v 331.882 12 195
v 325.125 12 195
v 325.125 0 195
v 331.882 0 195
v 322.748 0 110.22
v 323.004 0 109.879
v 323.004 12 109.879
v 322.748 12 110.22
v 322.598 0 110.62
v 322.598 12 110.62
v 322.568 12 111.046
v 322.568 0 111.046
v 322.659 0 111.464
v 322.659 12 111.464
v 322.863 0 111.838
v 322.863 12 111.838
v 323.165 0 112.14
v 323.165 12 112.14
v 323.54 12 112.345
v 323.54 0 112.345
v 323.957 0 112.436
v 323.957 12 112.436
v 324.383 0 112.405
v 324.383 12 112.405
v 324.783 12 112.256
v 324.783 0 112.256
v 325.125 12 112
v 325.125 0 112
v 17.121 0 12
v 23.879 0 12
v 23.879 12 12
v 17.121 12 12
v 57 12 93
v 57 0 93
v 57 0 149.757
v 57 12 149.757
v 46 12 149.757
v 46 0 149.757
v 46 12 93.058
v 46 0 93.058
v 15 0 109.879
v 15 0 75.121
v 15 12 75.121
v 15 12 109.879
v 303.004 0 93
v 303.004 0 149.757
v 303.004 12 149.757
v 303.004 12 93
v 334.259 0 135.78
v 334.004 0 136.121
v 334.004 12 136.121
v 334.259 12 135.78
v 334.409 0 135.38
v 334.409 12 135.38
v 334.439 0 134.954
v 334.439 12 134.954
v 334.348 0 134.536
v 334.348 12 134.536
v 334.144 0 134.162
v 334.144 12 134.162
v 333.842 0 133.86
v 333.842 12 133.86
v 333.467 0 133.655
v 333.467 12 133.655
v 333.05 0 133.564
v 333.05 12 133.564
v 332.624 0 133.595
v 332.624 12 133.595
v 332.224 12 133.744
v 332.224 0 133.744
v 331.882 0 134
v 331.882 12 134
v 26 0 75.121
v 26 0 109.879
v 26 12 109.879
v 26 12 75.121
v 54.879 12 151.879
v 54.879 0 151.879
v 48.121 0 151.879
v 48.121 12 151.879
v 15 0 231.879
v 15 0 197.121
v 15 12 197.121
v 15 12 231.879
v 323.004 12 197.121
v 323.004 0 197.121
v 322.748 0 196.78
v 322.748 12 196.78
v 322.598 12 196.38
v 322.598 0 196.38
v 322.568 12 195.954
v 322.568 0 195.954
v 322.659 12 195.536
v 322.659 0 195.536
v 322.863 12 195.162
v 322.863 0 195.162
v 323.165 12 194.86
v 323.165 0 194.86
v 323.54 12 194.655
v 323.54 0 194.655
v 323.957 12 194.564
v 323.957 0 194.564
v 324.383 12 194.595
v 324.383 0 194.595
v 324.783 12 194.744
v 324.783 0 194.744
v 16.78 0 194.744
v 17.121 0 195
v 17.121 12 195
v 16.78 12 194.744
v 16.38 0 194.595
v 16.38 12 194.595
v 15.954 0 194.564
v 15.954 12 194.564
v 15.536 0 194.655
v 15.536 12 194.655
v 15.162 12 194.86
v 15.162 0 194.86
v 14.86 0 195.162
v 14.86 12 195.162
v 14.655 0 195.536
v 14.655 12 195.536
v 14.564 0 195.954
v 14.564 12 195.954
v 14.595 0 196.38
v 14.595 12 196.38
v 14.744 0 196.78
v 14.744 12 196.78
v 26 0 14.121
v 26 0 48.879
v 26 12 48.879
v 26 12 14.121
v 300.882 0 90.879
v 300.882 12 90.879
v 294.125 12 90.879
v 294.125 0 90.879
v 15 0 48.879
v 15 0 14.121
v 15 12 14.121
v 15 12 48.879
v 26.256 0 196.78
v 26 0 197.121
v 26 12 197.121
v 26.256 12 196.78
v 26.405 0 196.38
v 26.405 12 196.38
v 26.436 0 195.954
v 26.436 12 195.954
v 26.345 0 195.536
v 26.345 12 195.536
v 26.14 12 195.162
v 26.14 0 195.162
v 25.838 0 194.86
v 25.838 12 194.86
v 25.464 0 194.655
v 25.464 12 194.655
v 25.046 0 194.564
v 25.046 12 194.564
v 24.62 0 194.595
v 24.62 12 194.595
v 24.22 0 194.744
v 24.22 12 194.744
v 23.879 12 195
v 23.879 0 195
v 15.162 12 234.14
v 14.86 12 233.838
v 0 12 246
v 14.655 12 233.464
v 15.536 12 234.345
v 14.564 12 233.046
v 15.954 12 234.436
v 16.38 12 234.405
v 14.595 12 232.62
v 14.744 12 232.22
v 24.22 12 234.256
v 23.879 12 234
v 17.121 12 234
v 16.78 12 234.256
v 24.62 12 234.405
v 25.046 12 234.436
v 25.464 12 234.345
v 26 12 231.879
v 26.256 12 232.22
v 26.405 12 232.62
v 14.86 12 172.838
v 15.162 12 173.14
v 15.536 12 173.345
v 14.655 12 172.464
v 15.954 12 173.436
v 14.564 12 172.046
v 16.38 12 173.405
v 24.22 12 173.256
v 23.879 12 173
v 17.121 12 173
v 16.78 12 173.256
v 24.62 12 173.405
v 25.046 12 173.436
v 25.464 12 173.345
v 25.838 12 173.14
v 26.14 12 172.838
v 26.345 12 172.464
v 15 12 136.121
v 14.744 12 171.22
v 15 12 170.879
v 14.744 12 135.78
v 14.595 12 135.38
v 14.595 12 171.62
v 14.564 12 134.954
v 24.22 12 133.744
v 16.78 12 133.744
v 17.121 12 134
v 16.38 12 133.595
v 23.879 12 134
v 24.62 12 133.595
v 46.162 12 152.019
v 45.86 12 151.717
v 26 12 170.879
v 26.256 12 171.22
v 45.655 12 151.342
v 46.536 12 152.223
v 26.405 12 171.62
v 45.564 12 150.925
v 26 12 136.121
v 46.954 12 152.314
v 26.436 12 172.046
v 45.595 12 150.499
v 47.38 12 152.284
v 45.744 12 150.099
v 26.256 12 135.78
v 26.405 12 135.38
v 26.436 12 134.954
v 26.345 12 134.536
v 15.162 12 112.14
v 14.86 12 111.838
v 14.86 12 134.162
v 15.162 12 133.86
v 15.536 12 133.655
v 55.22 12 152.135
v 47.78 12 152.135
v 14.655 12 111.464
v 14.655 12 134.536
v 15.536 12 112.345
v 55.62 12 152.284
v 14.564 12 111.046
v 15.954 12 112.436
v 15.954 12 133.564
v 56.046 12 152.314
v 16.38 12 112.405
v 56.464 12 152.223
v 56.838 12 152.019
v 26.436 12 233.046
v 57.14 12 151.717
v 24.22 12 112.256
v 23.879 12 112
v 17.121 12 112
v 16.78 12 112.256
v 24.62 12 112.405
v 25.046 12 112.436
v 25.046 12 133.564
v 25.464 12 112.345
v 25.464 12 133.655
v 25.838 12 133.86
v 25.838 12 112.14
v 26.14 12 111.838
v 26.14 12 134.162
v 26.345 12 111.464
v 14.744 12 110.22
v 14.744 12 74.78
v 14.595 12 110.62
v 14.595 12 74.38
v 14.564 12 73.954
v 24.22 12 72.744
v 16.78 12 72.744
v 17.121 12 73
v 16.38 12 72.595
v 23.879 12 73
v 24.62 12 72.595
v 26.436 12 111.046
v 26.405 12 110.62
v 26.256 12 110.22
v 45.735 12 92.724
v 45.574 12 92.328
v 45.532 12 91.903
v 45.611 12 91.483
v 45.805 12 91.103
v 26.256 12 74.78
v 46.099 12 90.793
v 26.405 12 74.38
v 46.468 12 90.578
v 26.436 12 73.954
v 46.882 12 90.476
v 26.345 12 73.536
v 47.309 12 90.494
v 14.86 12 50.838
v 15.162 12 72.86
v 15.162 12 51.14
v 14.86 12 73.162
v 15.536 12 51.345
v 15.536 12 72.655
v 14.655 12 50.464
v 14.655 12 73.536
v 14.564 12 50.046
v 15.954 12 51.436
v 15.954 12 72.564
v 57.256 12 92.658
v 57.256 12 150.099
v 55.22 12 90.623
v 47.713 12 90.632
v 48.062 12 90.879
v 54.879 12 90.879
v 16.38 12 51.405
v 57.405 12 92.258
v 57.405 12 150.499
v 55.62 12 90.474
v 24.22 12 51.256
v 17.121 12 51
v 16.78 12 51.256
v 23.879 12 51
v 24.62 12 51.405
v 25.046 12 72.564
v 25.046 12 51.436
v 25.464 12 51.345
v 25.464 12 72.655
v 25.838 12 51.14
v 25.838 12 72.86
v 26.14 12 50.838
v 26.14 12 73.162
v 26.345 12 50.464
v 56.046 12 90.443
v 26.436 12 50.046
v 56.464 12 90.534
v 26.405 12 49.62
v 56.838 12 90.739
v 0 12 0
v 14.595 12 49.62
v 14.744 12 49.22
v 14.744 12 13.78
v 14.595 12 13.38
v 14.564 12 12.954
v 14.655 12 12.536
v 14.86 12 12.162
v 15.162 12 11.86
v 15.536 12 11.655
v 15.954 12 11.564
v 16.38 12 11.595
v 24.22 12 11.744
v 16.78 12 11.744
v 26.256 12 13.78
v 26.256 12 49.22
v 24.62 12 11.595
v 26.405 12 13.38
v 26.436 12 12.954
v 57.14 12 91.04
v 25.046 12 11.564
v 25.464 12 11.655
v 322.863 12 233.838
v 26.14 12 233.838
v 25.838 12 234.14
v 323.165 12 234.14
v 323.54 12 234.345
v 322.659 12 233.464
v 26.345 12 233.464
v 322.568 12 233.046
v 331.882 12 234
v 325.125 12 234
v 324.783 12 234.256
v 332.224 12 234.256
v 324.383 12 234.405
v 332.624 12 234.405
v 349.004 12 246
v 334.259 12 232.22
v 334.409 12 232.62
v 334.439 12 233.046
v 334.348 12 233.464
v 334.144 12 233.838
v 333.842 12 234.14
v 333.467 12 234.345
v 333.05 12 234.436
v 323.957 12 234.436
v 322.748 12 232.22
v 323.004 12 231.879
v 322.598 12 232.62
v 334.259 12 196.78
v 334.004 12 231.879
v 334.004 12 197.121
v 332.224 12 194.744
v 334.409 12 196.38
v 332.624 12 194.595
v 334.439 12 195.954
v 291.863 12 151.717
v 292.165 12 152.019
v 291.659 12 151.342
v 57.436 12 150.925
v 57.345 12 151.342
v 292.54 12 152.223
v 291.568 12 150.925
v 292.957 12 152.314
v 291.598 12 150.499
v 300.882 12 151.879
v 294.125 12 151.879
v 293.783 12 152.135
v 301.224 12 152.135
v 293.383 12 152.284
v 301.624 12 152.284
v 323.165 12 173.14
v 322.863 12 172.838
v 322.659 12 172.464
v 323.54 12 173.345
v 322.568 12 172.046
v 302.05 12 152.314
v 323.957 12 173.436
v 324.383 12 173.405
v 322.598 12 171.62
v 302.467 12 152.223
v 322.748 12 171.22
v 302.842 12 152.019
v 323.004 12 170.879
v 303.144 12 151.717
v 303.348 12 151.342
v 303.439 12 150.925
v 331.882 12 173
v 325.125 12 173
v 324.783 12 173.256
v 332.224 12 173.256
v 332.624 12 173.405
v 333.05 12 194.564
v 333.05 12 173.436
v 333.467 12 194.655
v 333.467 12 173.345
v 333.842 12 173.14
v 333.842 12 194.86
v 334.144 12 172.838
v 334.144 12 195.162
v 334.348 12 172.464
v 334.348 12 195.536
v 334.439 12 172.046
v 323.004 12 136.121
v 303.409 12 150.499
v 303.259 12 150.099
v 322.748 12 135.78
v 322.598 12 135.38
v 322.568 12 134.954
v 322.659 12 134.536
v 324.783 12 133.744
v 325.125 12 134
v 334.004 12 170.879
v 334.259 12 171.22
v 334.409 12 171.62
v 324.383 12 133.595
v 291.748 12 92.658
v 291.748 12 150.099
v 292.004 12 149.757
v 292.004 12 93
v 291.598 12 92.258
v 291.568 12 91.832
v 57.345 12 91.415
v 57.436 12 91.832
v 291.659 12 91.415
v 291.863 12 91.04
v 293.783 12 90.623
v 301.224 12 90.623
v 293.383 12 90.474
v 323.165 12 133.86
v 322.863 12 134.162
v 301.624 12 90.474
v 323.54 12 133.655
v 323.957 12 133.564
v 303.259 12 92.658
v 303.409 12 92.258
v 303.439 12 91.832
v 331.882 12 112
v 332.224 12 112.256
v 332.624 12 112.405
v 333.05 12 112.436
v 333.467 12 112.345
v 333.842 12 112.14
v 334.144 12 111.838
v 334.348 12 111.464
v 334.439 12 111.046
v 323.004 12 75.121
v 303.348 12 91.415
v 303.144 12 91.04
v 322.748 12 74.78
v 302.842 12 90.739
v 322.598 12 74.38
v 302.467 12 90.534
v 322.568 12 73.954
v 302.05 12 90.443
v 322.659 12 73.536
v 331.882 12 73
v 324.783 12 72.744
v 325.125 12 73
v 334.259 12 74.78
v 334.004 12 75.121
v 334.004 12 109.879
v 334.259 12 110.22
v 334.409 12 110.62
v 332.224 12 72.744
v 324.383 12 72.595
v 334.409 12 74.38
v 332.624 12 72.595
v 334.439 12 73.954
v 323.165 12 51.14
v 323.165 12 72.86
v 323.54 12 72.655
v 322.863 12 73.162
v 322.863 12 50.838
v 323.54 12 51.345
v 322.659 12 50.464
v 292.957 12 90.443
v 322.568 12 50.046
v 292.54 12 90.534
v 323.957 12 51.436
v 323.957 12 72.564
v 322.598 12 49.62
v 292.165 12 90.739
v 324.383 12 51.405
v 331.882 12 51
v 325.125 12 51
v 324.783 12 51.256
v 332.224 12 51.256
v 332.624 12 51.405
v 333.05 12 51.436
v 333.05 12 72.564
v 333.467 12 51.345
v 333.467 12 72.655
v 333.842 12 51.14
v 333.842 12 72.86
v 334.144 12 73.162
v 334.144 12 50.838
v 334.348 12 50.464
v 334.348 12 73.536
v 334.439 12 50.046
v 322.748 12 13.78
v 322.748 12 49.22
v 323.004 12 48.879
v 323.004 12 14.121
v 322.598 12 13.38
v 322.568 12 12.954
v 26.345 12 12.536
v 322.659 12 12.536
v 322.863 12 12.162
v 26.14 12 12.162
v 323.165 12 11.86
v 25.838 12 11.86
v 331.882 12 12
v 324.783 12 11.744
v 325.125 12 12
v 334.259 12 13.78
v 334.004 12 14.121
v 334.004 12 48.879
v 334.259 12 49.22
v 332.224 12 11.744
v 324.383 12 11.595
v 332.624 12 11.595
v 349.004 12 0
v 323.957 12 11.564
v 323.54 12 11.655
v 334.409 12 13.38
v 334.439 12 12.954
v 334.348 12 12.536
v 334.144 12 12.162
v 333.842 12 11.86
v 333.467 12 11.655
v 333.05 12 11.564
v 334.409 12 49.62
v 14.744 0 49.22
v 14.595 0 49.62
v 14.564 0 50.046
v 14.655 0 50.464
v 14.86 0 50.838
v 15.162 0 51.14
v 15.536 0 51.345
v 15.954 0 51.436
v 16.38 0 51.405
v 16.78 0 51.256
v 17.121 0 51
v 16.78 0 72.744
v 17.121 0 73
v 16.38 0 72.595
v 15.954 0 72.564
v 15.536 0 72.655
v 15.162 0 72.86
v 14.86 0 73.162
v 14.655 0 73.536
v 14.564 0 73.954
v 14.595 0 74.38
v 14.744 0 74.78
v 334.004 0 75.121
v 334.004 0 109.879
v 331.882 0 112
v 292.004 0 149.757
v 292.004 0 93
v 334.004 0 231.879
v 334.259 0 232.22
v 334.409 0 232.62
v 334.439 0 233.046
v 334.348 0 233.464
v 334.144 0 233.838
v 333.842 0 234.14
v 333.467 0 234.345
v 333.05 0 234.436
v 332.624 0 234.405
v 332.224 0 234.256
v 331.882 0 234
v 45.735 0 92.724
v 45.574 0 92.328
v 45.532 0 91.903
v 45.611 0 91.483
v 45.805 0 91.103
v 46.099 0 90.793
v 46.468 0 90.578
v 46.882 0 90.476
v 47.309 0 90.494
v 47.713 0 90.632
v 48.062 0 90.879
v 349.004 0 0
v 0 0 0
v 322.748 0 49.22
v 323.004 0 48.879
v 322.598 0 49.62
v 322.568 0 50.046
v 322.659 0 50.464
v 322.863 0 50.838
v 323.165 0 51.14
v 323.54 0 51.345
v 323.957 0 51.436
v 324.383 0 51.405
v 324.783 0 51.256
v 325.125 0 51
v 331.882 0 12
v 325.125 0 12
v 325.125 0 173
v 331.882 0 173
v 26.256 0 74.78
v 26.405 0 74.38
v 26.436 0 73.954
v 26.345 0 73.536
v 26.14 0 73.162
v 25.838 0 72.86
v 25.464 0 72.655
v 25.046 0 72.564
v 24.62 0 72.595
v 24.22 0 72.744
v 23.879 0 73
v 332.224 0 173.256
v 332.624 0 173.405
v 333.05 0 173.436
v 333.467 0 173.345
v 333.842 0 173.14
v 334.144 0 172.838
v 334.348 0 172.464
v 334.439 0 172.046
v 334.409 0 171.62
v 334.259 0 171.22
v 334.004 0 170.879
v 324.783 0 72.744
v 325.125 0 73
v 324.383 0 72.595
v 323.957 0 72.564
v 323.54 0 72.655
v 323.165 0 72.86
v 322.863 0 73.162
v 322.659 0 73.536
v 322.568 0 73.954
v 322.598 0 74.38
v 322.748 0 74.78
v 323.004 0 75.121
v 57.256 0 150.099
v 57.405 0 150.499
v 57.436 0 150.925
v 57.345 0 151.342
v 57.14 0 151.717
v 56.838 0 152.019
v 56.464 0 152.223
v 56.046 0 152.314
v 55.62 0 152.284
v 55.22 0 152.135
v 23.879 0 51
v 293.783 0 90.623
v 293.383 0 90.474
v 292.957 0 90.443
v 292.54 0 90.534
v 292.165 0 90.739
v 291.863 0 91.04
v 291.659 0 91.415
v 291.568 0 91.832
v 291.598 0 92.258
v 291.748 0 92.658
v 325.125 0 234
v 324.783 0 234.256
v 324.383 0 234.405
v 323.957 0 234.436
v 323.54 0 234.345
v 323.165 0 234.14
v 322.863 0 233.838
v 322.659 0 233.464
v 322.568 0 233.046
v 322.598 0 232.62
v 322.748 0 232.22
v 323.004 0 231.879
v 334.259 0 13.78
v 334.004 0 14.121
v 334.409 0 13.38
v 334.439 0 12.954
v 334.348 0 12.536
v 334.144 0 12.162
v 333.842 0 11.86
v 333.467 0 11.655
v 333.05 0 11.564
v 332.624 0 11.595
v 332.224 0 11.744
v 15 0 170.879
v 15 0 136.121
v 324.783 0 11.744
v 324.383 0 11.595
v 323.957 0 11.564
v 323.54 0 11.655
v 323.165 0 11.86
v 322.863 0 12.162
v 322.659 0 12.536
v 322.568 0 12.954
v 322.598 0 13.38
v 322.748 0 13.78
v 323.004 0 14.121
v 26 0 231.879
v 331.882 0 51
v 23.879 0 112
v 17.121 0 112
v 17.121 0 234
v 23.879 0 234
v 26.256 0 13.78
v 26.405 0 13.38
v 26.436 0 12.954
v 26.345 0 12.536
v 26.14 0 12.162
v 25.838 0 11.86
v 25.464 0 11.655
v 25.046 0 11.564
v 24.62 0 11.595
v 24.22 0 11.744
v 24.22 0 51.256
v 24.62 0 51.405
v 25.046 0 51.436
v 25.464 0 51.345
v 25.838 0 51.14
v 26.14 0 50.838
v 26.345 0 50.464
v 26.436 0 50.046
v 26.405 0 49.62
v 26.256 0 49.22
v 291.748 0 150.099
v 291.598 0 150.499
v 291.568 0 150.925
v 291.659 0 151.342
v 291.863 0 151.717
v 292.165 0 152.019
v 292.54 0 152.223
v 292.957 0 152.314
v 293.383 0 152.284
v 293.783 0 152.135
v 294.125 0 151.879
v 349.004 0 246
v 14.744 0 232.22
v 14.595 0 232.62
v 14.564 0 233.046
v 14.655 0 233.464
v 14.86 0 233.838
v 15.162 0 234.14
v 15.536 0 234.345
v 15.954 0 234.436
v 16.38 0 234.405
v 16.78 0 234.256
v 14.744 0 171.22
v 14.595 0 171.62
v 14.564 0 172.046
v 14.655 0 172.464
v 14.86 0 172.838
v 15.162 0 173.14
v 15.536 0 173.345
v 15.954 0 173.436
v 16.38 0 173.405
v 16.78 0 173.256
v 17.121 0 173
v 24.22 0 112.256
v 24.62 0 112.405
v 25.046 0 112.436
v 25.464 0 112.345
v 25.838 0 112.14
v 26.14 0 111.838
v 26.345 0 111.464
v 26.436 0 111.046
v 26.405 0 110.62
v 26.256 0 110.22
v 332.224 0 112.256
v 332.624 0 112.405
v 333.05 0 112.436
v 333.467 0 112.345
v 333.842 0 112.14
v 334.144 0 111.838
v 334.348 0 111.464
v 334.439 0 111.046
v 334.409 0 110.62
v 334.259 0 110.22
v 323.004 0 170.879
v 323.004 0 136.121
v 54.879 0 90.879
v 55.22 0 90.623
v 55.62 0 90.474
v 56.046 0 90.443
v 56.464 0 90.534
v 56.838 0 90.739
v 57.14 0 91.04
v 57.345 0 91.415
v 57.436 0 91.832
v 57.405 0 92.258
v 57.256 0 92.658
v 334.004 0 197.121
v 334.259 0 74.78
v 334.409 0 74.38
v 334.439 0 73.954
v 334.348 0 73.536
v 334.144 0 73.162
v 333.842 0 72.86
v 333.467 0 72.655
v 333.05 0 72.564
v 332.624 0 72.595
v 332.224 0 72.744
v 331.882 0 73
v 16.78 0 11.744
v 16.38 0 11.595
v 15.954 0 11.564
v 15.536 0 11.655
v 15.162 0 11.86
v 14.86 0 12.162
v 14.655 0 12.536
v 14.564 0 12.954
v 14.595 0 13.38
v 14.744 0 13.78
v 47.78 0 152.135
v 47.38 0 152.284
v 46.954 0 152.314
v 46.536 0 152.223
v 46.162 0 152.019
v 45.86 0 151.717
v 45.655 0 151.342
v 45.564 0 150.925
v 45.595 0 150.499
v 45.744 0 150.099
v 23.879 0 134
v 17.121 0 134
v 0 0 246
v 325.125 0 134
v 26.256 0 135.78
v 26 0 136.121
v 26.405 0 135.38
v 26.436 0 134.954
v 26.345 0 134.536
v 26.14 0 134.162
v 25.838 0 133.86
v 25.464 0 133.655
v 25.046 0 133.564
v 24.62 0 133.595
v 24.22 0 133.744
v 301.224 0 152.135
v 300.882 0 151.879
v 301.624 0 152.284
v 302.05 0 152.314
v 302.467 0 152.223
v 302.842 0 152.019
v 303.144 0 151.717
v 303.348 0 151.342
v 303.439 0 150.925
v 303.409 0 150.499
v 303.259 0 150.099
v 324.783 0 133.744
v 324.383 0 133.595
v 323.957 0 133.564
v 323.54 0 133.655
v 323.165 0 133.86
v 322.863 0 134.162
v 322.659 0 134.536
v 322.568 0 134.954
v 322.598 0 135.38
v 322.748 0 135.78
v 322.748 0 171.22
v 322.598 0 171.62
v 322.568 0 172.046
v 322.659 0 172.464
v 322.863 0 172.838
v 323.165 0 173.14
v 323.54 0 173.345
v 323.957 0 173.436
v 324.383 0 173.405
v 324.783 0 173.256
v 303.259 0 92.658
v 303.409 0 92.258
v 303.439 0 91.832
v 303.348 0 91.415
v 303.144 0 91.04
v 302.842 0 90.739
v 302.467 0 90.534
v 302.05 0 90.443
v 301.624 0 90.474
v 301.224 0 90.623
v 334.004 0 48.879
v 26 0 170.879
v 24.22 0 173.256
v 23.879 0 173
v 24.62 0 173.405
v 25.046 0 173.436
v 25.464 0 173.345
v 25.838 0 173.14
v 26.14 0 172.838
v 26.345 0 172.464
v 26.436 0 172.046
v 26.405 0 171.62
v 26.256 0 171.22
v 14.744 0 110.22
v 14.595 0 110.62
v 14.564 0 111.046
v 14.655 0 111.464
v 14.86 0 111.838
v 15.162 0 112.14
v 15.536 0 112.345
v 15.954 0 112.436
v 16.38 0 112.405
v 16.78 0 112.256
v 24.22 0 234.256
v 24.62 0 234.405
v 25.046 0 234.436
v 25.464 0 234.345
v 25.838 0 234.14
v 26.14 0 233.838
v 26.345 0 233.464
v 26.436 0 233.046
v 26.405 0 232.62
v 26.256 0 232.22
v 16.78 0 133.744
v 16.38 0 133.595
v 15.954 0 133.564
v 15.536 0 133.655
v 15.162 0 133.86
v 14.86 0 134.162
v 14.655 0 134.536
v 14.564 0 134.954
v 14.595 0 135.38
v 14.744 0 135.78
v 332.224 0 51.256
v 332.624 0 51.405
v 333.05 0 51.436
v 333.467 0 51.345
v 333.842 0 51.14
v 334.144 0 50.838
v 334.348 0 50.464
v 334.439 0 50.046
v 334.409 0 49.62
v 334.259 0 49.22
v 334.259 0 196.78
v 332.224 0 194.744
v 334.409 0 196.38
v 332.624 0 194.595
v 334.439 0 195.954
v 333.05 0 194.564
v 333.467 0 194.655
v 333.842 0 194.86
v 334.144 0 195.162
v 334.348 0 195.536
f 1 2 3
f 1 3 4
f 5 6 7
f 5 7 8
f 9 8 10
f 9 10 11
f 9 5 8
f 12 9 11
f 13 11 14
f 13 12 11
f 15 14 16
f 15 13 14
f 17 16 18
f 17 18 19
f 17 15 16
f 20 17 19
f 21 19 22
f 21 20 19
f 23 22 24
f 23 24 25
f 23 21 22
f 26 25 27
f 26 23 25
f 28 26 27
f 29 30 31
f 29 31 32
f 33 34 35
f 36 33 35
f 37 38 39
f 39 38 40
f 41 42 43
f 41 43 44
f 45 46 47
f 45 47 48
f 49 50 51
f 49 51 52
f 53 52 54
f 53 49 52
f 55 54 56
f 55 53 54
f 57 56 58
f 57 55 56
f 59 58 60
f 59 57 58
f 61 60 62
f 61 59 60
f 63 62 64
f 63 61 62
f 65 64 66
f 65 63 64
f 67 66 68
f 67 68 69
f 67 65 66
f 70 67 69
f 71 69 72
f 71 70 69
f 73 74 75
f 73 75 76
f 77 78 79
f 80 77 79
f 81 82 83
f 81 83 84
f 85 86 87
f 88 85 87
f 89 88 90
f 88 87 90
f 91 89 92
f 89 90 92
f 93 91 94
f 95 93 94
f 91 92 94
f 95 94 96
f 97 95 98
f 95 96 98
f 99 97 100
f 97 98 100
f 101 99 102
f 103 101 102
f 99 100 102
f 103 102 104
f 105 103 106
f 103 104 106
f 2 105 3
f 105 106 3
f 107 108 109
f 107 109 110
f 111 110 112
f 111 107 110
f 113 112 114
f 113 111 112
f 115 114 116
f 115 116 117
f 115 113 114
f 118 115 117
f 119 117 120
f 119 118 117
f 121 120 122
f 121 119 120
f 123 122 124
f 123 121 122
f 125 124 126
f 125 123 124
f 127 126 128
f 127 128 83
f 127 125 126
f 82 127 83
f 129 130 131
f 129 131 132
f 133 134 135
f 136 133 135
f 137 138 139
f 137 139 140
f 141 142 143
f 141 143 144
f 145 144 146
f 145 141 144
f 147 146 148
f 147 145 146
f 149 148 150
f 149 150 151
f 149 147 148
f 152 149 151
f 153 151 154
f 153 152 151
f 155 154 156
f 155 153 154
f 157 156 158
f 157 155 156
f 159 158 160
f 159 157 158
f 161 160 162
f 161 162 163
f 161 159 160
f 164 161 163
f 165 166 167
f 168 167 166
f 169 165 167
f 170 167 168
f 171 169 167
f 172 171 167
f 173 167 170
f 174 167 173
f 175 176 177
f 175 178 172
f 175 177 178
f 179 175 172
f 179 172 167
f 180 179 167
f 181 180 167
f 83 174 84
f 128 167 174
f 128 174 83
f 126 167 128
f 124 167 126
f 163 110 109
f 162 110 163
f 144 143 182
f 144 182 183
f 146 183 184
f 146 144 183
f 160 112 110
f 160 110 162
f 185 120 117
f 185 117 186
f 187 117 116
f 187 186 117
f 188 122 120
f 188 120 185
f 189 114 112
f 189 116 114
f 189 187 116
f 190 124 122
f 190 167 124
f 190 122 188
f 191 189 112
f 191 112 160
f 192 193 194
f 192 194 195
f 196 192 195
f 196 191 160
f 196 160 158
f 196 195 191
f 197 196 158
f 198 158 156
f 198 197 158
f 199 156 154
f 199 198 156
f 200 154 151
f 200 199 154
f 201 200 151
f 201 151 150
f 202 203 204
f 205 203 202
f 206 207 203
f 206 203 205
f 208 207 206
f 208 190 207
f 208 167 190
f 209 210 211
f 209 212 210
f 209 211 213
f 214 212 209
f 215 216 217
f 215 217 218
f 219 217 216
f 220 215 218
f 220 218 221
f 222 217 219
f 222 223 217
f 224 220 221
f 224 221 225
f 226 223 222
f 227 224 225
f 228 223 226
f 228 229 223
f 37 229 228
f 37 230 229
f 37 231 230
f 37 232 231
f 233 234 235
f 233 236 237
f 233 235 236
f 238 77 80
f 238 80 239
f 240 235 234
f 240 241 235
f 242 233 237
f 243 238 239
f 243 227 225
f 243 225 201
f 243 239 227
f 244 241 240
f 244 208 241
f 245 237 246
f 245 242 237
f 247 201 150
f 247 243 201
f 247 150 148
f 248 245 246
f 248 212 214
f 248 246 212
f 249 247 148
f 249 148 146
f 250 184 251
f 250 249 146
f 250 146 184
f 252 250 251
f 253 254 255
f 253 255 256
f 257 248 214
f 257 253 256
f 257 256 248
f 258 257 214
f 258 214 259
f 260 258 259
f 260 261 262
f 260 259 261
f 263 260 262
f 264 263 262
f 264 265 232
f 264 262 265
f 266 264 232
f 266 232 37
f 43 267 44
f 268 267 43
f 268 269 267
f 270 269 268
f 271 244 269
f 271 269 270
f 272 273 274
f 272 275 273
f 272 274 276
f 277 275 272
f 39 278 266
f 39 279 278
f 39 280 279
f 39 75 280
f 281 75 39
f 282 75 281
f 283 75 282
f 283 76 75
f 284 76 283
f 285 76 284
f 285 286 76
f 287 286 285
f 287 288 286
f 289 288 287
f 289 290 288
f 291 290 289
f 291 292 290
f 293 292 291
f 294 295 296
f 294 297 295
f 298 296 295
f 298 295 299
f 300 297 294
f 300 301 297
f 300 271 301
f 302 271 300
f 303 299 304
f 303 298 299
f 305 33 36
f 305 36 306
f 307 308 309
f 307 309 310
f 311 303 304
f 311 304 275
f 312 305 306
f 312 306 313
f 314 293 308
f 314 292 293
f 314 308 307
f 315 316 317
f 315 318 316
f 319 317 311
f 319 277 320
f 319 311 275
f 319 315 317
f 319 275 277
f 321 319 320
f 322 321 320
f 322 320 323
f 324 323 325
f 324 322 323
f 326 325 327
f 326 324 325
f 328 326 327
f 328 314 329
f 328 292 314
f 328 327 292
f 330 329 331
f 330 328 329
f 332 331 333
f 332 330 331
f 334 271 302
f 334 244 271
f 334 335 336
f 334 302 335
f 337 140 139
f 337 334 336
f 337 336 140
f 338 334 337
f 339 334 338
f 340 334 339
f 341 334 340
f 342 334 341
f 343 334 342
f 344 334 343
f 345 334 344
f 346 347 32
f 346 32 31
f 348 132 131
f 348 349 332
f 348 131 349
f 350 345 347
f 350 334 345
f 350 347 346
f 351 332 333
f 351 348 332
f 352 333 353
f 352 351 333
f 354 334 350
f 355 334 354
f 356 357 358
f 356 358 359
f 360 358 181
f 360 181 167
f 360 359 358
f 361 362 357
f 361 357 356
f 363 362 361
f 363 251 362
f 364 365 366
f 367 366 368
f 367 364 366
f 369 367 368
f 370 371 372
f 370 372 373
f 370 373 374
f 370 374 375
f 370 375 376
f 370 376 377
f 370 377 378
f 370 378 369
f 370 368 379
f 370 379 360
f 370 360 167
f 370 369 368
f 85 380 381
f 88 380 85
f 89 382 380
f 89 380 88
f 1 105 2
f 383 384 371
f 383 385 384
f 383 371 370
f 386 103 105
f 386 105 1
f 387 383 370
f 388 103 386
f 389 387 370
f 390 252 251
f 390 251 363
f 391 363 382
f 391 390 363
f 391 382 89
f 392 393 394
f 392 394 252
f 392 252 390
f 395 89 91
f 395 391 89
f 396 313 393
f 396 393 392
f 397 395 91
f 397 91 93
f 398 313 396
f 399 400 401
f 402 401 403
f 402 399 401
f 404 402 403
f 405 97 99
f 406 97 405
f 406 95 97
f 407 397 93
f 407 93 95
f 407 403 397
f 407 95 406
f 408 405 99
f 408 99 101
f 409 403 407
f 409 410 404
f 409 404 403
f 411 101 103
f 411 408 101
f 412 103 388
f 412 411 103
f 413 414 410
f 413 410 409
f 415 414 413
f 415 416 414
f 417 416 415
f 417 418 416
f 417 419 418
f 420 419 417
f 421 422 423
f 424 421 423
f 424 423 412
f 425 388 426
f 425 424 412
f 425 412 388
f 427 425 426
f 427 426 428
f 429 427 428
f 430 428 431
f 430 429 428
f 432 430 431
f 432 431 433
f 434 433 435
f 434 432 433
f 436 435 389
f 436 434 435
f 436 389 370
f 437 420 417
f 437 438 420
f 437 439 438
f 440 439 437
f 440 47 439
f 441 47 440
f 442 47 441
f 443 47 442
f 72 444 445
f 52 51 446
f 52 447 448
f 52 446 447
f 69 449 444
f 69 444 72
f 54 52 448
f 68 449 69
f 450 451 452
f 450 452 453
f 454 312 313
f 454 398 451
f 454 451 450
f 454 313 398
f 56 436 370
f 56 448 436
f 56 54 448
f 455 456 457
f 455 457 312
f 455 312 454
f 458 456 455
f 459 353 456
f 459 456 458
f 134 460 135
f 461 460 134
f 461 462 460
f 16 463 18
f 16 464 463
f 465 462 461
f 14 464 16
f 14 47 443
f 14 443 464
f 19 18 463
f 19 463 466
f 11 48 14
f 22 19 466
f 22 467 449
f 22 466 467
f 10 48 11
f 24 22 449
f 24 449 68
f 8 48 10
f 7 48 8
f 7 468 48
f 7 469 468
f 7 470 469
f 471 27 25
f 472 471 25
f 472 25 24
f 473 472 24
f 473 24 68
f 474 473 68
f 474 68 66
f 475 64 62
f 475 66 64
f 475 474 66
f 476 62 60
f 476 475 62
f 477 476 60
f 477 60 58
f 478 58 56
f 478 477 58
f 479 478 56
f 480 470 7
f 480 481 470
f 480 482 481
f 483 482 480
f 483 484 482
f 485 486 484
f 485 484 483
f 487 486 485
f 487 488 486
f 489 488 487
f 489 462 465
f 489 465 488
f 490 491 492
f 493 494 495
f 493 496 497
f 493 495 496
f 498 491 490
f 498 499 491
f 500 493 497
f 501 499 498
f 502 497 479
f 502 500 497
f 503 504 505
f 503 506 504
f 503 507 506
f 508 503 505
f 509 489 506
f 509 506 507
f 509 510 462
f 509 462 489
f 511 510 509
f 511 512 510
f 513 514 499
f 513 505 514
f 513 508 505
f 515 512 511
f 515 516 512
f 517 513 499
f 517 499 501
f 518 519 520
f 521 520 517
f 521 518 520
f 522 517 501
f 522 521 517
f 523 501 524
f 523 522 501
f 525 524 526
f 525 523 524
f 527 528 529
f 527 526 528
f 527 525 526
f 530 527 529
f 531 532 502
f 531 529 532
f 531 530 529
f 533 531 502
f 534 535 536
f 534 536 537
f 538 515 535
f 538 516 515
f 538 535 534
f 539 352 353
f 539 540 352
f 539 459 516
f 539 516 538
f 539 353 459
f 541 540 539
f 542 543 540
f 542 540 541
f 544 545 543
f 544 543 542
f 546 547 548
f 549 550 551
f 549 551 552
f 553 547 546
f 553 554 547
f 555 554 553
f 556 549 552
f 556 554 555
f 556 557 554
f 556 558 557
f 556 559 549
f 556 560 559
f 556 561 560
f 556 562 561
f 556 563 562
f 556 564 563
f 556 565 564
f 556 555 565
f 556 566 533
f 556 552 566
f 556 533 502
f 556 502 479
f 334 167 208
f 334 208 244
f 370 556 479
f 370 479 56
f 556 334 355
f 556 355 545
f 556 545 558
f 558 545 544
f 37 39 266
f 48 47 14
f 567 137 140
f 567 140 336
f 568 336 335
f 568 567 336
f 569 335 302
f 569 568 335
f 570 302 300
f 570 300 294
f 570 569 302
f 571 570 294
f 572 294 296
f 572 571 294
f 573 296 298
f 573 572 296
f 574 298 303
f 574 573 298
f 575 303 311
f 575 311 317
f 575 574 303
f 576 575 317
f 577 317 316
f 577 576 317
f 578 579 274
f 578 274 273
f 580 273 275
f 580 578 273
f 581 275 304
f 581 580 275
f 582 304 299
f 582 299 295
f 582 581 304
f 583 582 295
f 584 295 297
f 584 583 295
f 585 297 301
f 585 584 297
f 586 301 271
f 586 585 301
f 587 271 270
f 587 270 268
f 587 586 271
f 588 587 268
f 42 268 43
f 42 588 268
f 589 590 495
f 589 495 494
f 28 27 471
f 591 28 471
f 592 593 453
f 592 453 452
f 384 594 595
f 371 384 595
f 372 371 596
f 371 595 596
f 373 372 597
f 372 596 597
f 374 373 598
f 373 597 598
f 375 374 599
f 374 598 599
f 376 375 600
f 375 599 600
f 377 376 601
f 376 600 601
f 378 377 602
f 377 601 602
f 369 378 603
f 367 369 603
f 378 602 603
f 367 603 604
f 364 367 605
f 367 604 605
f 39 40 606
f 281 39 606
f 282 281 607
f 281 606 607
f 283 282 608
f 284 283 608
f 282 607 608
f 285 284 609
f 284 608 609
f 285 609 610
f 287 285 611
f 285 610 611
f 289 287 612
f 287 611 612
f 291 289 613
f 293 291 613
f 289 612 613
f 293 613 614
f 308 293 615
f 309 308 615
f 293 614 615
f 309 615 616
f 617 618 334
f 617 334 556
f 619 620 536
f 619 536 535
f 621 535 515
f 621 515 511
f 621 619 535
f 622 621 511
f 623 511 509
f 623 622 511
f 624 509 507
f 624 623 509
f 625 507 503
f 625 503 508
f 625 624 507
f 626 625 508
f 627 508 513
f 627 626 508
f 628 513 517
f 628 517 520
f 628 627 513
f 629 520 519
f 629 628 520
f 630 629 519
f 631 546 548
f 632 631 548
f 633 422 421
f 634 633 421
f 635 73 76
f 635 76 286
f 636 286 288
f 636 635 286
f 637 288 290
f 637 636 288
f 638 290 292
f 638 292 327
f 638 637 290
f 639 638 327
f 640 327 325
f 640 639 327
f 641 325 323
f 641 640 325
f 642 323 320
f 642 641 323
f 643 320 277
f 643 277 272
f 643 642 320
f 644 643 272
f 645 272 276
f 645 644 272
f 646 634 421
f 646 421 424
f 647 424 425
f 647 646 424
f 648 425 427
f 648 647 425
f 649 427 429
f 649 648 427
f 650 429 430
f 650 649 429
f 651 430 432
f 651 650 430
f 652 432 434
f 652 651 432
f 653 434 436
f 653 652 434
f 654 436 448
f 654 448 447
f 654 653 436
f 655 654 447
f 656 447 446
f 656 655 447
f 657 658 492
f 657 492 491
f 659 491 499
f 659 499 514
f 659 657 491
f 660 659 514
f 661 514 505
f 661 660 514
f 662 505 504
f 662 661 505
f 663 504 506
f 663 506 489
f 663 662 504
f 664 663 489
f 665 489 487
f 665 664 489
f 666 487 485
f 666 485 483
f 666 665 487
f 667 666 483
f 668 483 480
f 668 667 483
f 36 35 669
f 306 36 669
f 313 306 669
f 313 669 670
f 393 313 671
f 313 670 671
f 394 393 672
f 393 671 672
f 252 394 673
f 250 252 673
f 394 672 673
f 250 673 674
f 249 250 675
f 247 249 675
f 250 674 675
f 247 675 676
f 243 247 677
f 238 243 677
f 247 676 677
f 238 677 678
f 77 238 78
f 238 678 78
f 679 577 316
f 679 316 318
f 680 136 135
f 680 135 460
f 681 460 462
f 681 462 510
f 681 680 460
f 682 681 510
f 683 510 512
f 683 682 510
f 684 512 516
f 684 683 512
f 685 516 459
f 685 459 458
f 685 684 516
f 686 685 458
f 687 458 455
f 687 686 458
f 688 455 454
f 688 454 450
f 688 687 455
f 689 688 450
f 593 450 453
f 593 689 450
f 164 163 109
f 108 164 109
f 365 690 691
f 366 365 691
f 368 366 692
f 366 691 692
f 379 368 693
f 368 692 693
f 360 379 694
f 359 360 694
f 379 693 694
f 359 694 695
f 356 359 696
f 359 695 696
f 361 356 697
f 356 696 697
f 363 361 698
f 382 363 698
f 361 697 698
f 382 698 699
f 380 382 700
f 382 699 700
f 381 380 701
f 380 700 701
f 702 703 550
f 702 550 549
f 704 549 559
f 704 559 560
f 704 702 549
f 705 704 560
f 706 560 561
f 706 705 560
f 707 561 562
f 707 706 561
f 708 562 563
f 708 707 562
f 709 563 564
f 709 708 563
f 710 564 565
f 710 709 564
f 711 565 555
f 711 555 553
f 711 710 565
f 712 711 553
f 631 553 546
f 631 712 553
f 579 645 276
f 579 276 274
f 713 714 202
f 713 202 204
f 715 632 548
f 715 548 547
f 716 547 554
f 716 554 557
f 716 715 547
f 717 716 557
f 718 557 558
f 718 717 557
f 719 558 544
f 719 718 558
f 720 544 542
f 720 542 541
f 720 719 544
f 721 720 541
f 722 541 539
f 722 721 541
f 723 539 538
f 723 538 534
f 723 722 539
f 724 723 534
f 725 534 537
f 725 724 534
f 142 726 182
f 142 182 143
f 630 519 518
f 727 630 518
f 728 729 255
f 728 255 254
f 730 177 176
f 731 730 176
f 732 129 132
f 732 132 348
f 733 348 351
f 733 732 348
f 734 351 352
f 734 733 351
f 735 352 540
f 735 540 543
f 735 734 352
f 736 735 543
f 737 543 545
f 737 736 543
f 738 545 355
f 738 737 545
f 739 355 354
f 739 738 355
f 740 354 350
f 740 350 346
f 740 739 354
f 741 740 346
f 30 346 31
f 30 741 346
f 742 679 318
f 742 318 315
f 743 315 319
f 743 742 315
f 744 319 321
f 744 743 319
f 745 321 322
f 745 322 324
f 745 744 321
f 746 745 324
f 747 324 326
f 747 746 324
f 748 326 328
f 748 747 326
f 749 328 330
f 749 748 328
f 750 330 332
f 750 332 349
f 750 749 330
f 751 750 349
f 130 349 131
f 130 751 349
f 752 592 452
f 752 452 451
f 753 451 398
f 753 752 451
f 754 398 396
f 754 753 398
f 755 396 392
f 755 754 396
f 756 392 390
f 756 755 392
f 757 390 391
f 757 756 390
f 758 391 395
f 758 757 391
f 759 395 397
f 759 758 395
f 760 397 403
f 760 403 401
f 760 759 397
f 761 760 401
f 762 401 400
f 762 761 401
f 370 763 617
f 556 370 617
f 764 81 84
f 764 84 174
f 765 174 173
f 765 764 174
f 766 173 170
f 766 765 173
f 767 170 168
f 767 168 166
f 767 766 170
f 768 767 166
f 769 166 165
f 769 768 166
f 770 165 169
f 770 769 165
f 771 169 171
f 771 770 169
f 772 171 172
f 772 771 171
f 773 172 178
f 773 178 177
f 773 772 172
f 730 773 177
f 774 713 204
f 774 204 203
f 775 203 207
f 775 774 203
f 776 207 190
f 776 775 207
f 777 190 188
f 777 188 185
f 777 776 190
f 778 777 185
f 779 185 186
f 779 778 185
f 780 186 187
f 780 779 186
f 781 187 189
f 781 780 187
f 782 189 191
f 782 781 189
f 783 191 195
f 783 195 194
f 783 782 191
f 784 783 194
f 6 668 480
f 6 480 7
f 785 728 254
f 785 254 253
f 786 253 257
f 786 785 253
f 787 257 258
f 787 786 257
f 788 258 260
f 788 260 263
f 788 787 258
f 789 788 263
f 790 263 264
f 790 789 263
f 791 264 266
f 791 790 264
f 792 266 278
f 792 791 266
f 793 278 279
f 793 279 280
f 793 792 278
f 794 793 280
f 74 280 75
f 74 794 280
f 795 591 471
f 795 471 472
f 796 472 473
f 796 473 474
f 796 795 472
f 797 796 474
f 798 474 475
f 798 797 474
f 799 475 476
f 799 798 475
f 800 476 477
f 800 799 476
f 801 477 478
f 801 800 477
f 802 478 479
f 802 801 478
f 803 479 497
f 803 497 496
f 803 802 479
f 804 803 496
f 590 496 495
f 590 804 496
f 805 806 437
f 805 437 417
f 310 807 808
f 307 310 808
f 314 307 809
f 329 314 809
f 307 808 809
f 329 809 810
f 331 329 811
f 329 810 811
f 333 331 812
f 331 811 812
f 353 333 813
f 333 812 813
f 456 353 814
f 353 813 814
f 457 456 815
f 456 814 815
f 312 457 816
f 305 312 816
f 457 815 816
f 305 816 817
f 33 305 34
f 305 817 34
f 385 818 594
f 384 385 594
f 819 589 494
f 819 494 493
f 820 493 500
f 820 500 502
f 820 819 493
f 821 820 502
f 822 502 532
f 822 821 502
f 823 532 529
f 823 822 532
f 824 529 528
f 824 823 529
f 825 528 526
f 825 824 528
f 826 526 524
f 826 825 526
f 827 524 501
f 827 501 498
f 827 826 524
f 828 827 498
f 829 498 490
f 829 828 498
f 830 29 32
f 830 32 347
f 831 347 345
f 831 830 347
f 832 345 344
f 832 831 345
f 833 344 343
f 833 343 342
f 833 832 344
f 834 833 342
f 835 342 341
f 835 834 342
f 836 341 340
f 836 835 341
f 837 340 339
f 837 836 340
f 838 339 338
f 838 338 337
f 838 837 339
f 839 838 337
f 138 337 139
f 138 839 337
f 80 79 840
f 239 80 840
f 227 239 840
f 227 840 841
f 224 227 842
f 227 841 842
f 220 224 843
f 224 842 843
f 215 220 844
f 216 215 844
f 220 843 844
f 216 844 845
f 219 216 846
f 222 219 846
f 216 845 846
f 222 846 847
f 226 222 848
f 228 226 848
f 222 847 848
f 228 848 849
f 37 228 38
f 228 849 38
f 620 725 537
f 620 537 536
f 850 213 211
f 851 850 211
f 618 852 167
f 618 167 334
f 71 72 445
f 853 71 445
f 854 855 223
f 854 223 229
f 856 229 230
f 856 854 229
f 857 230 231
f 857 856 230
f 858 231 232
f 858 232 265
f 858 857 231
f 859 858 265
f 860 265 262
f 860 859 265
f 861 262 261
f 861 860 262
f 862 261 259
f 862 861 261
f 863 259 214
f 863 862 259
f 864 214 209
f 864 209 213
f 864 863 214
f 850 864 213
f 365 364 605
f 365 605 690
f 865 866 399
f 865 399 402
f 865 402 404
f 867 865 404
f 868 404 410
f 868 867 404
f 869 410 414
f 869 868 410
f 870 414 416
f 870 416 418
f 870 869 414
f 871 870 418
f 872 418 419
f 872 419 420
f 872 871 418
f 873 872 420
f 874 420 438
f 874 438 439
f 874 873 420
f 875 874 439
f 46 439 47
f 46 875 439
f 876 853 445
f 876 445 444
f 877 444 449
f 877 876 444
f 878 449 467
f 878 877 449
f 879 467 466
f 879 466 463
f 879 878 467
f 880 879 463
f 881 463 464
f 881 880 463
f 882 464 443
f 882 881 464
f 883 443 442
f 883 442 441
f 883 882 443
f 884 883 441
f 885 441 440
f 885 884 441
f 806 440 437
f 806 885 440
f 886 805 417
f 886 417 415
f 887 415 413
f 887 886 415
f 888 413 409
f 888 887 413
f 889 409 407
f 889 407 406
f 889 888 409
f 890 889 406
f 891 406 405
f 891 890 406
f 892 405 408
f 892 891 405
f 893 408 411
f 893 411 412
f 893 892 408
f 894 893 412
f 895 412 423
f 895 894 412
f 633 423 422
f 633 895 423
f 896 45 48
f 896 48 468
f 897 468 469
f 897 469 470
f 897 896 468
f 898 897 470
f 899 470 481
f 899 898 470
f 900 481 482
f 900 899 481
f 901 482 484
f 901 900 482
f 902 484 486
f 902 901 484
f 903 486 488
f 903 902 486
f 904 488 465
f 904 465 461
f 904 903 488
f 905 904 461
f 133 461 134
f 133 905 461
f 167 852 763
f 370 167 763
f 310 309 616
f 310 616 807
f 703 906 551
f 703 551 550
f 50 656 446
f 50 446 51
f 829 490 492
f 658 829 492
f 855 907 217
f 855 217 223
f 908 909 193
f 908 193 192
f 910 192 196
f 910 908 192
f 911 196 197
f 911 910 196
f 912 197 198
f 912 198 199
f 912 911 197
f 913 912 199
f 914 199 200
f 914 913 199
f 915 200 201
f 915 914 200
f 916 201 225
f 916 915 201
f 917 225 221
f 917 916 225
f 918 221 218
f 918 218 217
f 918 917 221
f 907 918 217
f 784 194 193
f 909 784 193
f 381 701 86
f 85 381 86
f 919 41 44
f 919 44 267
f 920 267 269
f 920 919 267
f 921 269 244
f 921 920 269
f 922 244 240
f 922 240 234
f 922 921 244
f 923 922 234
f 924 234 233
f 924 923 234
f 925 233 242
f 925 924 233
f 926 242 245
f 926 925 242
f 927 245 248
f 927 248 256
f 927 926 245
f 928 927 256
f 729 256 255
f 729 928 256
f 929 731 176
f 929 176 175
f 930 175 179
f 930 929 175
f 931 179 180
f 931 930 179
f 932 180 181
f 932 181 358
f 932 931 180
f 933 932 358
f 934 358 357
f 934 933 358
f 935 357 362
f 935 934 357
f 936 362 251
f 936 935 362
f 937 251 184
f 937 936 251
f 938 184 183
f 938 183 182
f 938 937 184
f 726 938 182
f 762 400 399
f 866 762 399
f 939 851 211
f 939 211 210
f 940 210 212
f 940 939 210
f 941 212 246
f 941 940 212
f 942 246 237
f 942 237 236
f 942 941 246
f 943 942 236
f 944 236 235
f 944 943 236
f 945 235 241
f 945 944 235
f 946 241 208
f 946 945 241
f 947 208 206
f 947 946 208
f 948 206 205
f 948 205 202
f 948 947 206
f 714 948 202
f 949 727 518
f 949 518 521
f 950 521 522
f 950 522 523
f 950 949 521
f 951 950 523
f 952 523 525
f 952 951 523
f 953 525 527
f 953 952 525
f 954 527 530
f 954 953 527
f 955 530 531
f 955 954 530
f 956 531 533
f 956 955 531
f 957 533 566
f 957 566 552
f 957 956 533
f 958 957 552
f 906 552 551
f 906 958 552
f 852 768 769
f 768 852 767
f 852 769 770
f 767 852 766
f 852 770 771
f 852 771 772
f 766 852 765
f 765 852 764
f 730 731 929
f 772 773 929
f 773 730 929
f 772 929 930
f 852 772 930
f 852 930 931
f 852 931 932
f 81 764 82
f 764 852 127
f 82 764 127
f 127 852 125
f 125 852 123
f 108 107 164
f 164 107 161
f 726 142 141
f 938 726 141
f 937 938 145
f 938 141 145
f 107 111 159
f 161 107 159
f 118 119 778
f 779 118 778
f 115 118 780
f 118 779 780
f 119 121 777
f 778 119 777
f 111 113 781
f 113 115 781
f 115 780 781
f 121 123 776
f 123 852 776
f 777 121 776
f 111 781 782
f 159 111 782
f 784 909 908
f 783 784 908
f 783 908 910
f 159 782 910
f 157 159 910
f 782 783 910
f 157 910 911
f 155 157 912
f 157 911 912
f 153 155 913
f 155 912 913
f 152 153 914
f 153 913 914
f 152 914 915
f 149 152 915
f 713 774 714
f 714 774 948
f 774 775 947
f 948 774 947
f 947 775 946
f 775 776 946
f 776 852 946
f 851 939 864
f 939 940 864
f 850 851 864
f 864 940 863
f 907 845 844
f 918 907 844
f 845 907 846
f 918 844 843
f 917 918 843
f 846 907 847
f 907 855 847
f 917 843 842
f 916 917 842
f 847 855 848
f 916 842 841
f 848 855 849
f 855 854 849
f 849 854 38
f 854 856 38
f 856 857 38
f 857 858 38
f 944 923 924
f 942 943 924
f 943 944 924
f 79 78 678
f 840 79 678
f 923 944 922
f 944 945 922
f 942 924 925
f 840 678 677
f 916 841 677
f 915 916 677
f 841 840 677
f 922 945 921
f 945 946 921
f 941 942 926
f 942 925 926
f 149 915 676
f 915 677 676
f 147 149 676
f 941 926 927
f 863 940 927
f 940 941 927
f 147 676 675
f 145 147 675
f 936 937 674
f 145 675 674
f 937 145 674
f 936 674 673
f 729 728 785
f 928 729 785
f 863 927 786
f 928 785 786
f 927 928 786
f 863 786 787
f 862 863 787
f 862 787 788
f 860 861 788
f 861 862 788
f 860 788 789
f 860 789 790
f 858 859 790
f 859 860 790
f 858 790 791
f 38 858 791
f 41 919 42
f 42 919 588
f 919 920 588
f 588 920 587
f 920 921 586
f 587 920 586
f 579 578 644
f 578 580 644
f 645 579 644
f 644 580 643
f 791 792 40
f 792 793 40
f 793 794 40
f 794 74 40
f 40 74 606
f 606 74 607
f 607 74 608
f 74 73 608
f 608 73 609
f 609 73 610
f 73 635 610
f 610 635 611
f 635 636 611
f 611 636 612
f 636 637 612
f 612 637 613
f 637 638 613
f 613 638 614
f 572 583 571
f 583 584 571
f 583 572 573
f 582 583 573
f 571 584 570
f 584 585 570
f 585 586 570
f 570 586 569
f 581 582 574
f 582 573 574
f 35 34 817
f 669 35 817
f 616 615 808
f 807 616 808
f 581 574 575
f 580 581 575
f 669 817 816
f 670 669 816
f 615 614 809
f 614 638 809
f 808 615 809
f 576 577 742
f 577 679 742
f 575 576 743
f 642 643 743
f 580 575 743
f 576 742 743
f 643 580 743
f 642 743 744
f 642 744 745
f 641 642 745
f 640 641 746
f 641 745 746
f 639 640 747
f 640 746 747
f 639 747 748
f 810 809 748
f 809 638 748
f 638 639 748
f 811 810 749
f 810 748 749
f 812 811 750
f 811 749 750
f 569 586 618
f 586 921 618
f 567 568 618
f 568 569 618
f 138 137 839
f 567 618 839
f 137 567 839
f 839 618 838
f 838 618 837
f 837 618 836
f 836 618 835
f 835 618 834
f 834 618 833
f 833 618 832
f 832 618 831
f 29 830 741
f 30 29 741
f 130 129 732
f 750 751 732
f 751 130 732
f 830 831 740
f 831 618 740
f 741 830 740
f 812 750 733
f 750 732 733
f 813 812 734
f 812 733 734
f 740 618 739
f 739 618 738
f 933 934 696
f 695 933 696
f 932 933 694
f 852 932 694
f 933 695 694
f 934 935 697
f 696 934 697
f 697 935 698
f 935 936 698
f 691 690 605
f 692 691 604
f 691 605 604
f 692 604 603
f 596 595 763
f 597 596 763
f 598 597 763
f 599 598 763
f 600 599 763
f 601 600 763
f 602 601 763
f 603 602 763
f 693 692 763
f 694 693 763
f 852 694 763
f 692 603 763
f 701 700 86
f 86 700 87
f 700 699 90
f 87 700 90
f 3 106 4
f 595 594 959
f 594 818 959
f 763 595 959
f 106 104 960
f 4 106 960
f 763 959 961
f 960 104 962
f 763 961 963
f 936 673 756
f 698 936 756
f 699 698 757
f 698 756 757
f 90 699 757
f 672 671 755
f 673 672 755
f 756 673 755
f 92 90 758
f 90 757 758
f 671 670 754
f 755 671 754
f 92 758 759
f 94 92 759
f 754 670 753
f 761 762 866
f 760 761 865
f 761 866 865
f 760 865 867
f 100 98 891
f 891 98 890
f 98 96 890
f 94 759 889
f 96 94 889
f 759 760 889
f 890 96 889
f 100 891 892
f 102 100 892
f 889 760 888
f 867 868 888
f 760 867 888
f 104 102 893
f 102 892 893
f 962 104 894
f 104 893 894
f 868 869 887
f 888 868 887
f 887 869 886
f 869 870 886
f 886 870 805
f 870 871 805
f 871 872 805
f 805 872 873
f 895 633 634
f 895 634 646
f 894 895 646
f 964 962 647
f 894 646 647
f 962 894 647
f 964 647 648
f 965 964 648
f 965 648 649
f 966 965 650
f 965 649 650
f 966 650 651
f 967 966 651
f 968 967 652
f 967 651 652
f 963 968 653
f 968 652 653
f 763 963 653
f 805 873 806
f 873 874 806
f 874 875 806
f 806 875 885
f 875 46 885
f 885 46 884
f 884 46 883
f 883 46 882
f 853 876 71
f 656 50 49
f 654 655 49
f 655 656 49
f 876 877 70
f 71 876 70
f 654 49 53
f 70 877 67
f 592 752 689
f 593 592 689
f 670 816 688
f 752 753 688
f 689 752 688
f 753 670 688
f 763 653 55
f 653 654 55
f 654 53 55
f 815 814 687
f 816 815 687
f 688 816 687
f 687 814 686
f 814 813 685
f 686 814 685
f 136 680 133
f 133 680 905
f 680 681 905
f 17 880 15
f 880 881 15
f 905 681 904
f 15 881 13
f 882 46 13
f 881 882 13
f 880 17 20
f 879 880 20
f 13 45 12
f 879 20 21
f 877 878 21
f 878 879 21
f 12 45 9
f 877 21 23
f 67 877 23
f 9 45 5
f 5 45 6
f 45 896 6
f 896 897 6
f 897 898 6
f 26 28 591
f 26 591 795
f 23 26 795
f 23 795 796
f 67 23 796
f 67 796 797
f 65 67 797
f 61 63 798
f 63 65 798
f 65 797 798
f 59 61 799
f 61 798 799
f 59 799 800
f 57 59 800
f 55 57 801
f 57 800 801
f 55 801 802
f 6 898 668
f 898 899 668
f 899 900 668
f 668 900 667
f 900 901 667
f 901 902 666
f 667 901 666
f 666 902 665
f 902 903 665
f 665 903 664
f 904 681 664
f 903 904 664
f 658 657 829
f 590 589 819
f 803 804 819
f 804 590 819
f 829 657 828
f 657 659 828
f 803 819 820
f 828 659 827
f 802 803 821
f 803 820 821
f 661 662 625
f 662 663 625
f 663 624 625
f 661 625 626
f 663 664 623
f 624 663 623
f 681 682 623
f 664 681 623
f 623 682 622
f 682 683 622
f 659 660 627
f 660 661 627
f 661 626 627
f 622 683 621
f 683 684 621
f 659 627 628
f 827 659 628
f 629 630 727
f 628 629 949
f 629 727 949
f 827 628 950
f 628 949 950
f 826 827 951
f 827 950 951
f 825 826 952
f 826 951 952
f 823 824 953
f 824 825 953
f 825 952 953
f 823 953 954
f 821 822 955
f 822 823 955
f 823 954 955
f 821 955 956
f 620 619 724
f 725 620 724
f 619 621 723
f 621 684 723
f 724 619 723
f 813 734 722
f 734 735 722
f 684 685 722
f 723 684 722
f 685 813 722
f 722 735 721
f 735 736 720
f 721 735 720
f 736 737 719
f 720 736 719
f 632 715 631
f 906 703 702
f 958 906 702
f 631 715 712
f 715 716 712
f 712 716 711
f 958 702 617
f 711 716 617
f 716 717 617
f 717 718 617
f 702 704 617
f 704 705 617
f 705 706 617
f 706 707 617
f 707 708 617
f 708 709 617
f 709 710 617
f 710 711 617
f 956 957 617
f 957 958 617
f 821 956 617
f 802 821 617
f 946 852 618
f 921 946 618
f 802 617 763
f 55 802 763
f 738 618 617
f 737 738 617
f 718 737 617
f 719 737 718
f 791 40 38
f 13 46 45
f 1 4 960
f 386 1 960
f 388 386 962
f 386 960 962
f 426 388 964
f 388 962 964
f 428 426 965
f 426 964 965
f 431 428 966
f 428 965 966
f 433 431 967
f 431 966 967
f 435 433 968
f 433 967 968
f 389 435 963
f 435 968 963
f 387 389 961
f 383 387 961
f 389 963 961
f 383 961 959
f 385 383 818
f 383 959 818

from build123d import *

# Parameters (mm, degrees)
CROQUIS1_W              = 349.003555023
CROQUIS1_H              = 246
SALIENTE_EXTRUIR1_DEPTH = 12


with BuildPart() as part:
    # Croquis1 → Saliente-Extruir1 (new body)
    with BuildSketch(Plane(origin=(0, 0, 0), x_dir=(1, 0, 0), z_dir=(0, 1, 0))):
        with Locations((174.501777512, -123)):
            Rectangle(CROQUIS1_W, CROQUIS1_H)
        with BuildLine():
            Line((17.121320344, -173), (23.878679656, -173))
            ThreePointArc((23.878679656, -173), (26, -173), (26, -170.878679656))
            Line((26, -170.878679656), (26, -136.121320344))
            ThreePointArc((26, -136.121320344), (26, -134), (23.878679656, -134))
            Line((23.878679656, -134), (17.121320344, -134))
            ThreePointArc((17.121320344, -134), (15, -134), (15, -136.121320344))
            Line((15, -136.121320344), (15, -170.878679656))
            ThreePointArc((15, -170.878679656), (15, -173), (17.121320344, -173))
        make_face(mode=Mode.SUBTRACT)
        with BuildLine():
            Line((46, -149.757359313), (46, -93.058131736))
            ThreePointArc((46, -93.058131736), (45.941048988, -90.937630668), (48.061550056, -90.878679656))
            Line((48.061550056, -90.878679656), (54.878679656, -90.878679656))
            ThreePointArc((54.878679656, -90.878679656), (57, -90.878679656), (57, -93))
            Line((57, -93), (57, -149.757359313))
            ThreePointArc((57, -149.757359313), (57, -151.878679656), (54.878679656, -151.878679656))
            Line((54.878679656, -151.878679656), (48.121320344, -151.878679656))
            ThreePointArc((48.121320344, -151.878679656), (46, -151.878679656), (46, -149.757359313))
        make_face(mode=Mode.SUBTRACT)
        with BuildLine():
            Line((17.121320344, -112), (23.878679656, -112))
            ThreePointArc((23.878679656, -112), (26, -112), (26, -109.878679656))
            Line((26, -109.878679656), (26, -75.121320344))
            ThreePointArc((26, -75.121320344), (26, -73), (23.878679656, -73))
            Line((23.878679656, -73), (17.121320344, -73))
            ThreePointArc((17.121320344, -73), (15, -73), (15, -75.121320344))
            Line((15, -75.121320344), (15, -109.878679656))
            ThreePointArc((15, -109.878679656), (15, -112), (17.121320344, -112))
        make_face(mode=Mode.SUBTRACT)
        with BuildLine():
            Line((26, -231.878679656), (26, -197.121320344))
            ThreePointArc((26, -197.121320344), (26, -195), (23.878679656, -195))
            Line((23.878679656, -195), (17.121320344, -195))
            ThreePointArc((17.121320344, -195), (15, -195), (15, -197.121320344))
            Line((15, -197.121320344), (15, -231.878679656))
            ThreePointArc((15, -231.878679656), (15, -234), (17.121320344, -234))
            Line((17.121320344, -234), (23.878679656, -234))
            ThreePointArc((23.878679656, -234), (26, -234), (26, -231.878679656))
        make_face(mode=Mode.SUBTRACT)
        with BuildLine():
            Line((17.121320344, -51), (23.878679656, -51))
            ThreePointArc((23.878679656, -51), (26, -51), (26, -48.878679656))
            Line((26, -48.878679656), (26, -14.121320344))
            ThreePointArc((26, -14.121320344), (26, -12), (23.878679656, -12))
            Line((23.878679656, -12), (17.121320344, -12))
            ThreePointArc((17.121320344, -12), (15, -12), (15, -14.121320344))
            Line((15, -14.121320344), (15, -48.878679656))
            ThreePointArc((15, -48.878679656), (15, -51), (17.121320344, -51))
        make_face(mode=Mode.SUBTRACT)
        with BuildLine():
            Line((331.88223468, -234), (325.124875367, -234))
            ThreePointArc((325.124875367, -234), (323.003555023, -234), (323.003555023, -231.878679656))
            Line((323.003555023, -231.878679656), (323.003555023, -197.121320344))
            ThreePointArc((323.003555023, -197.121320344), (323.003555023, -195), (325.124875367, -195))
            Line((325.124875367, -195), (331.88223468, -195))
            ThreePointArc((331.88223468, -195), (334.003555023, -195), (334.003555023, -197.121320344))
            Line((334.003555023, -197.121320344), (334.003555023, -231.878679656))
            ThreePointArc((334.003555023, -231.878679656), (334.003555023, -234), (331.88223468, -234))
        make_face(mode=Mode.SUBTRACT)
        with BuildLine():
            Line((325.124875367, -173), (331.88223468, -173))
            ThreePointArc((331.88223468, -173), (334.003555023, -173), (334.003555023, -170.878679656))
            Line((334.003555023, -170.878679656), (334.003555023, -136.121320344))
            ThreePointArc((334.003555023, -136.121320344), (334.003555023, -134), (331.88223468, -134))
            Line((331.88223468, -134), (325.124875367, -134))
            ThreePointArc((325.124875367, -134), (323.003555023, -134), (323.003555023, -136.121320344))
            Line((323.003555023, -136.121320344), (323.003555023, -170.878679656))
            ThreePointArc((323.003555023, -170.878679656), (323.003555023, -173), (325.124875367, -173))
        make_face(mode=Mode.SUBTRACT)
        with BuildLine():
            Line((325.124875367, -112), (331.88223468, -112))
            ThreePointArc((331.88223468, -112), (334.003555023, -112), (334.003555023, -109.878679656))
            Line((334.003555023, -109.878679656), (334.003555023, -75.121320344))
            ThreePointArc((334.003555023, -75.121320344), (334.003555023, -73), (331.88223468, -73))
            Line((331.88223468, -73), (325.124875367, -73))
            ThreePointArc((325.124875367, -73), (323.003555023, -73), (323.003555023, -75.121320344))
            Line((323.003555023, -75.121320344), (323.003555023, -109.878679656))
            ThreePointArc((323.003555023, -109.878679656), (323.003555023, -112), (325.124875367, -112))
        make_face(mode=Mode.SUBTRACT)
        with BuildLine():
            Line((325.124875367, -51), (331.88223468, -51))
            ThreePointArc((331.88223468, -51), (334.003555023, -51), (334.003555023, -48.878679656))
            Line((334.003555023, -48.878679656), (334.003555023, -14.121320344))
            ThreePointArc((334.003555023, -14.121320344), (334.003555023, -12), (331.88223468, -12))
            Line((331.88223468, -12), (325.124875367, -12))
            ThreePointArc((325.124875367, -12), (323.003555023, -12), (323.003555023, -14.121320344))
            Line((323.003555023, -14.121320344), (323.003555023, -48.878679656))
            ThreePointArc((323.003555023, -48.878679656), (323.003555023, -51), (325.124875367, -51))
        make_face(mode=Mode.SUBTRACT)
        with BuildLine():
            Line((303.003555023, -149.757359313), (303.003555023, -93))
            ThreePointArc((303.003555023, -93), (303.003555023, -90.878679656), (300.88223468, -90.878679656))
            Line((300.88223468, -90.878679656), (294.124875367, -90.878679656))
            ThreePointArc((294.124875367, -90.878679656), (292.003555023, -90.878679656), (292.003555023, -93))
            Line((292.003555023, -93), (292.003555023, -149.757359313))
            ThreePointArc((292.003555023, -149.757359313), (292.003555023, -151.878679656), (294.124875367, -151.878679656))
            Line((294.124875367, -151.878679656), (300.88223468, -151.878679656))
            ThreePointArc((300.88223468, -151.878679656), (303.003555023, -151.878679656), (303.003555023, -149.757359313))
        make_face(mode=Mode.SUBTRACT)
    extrude(amount=SALIENTE_EXTRUIR1_DEPTH)


solid = part.part
